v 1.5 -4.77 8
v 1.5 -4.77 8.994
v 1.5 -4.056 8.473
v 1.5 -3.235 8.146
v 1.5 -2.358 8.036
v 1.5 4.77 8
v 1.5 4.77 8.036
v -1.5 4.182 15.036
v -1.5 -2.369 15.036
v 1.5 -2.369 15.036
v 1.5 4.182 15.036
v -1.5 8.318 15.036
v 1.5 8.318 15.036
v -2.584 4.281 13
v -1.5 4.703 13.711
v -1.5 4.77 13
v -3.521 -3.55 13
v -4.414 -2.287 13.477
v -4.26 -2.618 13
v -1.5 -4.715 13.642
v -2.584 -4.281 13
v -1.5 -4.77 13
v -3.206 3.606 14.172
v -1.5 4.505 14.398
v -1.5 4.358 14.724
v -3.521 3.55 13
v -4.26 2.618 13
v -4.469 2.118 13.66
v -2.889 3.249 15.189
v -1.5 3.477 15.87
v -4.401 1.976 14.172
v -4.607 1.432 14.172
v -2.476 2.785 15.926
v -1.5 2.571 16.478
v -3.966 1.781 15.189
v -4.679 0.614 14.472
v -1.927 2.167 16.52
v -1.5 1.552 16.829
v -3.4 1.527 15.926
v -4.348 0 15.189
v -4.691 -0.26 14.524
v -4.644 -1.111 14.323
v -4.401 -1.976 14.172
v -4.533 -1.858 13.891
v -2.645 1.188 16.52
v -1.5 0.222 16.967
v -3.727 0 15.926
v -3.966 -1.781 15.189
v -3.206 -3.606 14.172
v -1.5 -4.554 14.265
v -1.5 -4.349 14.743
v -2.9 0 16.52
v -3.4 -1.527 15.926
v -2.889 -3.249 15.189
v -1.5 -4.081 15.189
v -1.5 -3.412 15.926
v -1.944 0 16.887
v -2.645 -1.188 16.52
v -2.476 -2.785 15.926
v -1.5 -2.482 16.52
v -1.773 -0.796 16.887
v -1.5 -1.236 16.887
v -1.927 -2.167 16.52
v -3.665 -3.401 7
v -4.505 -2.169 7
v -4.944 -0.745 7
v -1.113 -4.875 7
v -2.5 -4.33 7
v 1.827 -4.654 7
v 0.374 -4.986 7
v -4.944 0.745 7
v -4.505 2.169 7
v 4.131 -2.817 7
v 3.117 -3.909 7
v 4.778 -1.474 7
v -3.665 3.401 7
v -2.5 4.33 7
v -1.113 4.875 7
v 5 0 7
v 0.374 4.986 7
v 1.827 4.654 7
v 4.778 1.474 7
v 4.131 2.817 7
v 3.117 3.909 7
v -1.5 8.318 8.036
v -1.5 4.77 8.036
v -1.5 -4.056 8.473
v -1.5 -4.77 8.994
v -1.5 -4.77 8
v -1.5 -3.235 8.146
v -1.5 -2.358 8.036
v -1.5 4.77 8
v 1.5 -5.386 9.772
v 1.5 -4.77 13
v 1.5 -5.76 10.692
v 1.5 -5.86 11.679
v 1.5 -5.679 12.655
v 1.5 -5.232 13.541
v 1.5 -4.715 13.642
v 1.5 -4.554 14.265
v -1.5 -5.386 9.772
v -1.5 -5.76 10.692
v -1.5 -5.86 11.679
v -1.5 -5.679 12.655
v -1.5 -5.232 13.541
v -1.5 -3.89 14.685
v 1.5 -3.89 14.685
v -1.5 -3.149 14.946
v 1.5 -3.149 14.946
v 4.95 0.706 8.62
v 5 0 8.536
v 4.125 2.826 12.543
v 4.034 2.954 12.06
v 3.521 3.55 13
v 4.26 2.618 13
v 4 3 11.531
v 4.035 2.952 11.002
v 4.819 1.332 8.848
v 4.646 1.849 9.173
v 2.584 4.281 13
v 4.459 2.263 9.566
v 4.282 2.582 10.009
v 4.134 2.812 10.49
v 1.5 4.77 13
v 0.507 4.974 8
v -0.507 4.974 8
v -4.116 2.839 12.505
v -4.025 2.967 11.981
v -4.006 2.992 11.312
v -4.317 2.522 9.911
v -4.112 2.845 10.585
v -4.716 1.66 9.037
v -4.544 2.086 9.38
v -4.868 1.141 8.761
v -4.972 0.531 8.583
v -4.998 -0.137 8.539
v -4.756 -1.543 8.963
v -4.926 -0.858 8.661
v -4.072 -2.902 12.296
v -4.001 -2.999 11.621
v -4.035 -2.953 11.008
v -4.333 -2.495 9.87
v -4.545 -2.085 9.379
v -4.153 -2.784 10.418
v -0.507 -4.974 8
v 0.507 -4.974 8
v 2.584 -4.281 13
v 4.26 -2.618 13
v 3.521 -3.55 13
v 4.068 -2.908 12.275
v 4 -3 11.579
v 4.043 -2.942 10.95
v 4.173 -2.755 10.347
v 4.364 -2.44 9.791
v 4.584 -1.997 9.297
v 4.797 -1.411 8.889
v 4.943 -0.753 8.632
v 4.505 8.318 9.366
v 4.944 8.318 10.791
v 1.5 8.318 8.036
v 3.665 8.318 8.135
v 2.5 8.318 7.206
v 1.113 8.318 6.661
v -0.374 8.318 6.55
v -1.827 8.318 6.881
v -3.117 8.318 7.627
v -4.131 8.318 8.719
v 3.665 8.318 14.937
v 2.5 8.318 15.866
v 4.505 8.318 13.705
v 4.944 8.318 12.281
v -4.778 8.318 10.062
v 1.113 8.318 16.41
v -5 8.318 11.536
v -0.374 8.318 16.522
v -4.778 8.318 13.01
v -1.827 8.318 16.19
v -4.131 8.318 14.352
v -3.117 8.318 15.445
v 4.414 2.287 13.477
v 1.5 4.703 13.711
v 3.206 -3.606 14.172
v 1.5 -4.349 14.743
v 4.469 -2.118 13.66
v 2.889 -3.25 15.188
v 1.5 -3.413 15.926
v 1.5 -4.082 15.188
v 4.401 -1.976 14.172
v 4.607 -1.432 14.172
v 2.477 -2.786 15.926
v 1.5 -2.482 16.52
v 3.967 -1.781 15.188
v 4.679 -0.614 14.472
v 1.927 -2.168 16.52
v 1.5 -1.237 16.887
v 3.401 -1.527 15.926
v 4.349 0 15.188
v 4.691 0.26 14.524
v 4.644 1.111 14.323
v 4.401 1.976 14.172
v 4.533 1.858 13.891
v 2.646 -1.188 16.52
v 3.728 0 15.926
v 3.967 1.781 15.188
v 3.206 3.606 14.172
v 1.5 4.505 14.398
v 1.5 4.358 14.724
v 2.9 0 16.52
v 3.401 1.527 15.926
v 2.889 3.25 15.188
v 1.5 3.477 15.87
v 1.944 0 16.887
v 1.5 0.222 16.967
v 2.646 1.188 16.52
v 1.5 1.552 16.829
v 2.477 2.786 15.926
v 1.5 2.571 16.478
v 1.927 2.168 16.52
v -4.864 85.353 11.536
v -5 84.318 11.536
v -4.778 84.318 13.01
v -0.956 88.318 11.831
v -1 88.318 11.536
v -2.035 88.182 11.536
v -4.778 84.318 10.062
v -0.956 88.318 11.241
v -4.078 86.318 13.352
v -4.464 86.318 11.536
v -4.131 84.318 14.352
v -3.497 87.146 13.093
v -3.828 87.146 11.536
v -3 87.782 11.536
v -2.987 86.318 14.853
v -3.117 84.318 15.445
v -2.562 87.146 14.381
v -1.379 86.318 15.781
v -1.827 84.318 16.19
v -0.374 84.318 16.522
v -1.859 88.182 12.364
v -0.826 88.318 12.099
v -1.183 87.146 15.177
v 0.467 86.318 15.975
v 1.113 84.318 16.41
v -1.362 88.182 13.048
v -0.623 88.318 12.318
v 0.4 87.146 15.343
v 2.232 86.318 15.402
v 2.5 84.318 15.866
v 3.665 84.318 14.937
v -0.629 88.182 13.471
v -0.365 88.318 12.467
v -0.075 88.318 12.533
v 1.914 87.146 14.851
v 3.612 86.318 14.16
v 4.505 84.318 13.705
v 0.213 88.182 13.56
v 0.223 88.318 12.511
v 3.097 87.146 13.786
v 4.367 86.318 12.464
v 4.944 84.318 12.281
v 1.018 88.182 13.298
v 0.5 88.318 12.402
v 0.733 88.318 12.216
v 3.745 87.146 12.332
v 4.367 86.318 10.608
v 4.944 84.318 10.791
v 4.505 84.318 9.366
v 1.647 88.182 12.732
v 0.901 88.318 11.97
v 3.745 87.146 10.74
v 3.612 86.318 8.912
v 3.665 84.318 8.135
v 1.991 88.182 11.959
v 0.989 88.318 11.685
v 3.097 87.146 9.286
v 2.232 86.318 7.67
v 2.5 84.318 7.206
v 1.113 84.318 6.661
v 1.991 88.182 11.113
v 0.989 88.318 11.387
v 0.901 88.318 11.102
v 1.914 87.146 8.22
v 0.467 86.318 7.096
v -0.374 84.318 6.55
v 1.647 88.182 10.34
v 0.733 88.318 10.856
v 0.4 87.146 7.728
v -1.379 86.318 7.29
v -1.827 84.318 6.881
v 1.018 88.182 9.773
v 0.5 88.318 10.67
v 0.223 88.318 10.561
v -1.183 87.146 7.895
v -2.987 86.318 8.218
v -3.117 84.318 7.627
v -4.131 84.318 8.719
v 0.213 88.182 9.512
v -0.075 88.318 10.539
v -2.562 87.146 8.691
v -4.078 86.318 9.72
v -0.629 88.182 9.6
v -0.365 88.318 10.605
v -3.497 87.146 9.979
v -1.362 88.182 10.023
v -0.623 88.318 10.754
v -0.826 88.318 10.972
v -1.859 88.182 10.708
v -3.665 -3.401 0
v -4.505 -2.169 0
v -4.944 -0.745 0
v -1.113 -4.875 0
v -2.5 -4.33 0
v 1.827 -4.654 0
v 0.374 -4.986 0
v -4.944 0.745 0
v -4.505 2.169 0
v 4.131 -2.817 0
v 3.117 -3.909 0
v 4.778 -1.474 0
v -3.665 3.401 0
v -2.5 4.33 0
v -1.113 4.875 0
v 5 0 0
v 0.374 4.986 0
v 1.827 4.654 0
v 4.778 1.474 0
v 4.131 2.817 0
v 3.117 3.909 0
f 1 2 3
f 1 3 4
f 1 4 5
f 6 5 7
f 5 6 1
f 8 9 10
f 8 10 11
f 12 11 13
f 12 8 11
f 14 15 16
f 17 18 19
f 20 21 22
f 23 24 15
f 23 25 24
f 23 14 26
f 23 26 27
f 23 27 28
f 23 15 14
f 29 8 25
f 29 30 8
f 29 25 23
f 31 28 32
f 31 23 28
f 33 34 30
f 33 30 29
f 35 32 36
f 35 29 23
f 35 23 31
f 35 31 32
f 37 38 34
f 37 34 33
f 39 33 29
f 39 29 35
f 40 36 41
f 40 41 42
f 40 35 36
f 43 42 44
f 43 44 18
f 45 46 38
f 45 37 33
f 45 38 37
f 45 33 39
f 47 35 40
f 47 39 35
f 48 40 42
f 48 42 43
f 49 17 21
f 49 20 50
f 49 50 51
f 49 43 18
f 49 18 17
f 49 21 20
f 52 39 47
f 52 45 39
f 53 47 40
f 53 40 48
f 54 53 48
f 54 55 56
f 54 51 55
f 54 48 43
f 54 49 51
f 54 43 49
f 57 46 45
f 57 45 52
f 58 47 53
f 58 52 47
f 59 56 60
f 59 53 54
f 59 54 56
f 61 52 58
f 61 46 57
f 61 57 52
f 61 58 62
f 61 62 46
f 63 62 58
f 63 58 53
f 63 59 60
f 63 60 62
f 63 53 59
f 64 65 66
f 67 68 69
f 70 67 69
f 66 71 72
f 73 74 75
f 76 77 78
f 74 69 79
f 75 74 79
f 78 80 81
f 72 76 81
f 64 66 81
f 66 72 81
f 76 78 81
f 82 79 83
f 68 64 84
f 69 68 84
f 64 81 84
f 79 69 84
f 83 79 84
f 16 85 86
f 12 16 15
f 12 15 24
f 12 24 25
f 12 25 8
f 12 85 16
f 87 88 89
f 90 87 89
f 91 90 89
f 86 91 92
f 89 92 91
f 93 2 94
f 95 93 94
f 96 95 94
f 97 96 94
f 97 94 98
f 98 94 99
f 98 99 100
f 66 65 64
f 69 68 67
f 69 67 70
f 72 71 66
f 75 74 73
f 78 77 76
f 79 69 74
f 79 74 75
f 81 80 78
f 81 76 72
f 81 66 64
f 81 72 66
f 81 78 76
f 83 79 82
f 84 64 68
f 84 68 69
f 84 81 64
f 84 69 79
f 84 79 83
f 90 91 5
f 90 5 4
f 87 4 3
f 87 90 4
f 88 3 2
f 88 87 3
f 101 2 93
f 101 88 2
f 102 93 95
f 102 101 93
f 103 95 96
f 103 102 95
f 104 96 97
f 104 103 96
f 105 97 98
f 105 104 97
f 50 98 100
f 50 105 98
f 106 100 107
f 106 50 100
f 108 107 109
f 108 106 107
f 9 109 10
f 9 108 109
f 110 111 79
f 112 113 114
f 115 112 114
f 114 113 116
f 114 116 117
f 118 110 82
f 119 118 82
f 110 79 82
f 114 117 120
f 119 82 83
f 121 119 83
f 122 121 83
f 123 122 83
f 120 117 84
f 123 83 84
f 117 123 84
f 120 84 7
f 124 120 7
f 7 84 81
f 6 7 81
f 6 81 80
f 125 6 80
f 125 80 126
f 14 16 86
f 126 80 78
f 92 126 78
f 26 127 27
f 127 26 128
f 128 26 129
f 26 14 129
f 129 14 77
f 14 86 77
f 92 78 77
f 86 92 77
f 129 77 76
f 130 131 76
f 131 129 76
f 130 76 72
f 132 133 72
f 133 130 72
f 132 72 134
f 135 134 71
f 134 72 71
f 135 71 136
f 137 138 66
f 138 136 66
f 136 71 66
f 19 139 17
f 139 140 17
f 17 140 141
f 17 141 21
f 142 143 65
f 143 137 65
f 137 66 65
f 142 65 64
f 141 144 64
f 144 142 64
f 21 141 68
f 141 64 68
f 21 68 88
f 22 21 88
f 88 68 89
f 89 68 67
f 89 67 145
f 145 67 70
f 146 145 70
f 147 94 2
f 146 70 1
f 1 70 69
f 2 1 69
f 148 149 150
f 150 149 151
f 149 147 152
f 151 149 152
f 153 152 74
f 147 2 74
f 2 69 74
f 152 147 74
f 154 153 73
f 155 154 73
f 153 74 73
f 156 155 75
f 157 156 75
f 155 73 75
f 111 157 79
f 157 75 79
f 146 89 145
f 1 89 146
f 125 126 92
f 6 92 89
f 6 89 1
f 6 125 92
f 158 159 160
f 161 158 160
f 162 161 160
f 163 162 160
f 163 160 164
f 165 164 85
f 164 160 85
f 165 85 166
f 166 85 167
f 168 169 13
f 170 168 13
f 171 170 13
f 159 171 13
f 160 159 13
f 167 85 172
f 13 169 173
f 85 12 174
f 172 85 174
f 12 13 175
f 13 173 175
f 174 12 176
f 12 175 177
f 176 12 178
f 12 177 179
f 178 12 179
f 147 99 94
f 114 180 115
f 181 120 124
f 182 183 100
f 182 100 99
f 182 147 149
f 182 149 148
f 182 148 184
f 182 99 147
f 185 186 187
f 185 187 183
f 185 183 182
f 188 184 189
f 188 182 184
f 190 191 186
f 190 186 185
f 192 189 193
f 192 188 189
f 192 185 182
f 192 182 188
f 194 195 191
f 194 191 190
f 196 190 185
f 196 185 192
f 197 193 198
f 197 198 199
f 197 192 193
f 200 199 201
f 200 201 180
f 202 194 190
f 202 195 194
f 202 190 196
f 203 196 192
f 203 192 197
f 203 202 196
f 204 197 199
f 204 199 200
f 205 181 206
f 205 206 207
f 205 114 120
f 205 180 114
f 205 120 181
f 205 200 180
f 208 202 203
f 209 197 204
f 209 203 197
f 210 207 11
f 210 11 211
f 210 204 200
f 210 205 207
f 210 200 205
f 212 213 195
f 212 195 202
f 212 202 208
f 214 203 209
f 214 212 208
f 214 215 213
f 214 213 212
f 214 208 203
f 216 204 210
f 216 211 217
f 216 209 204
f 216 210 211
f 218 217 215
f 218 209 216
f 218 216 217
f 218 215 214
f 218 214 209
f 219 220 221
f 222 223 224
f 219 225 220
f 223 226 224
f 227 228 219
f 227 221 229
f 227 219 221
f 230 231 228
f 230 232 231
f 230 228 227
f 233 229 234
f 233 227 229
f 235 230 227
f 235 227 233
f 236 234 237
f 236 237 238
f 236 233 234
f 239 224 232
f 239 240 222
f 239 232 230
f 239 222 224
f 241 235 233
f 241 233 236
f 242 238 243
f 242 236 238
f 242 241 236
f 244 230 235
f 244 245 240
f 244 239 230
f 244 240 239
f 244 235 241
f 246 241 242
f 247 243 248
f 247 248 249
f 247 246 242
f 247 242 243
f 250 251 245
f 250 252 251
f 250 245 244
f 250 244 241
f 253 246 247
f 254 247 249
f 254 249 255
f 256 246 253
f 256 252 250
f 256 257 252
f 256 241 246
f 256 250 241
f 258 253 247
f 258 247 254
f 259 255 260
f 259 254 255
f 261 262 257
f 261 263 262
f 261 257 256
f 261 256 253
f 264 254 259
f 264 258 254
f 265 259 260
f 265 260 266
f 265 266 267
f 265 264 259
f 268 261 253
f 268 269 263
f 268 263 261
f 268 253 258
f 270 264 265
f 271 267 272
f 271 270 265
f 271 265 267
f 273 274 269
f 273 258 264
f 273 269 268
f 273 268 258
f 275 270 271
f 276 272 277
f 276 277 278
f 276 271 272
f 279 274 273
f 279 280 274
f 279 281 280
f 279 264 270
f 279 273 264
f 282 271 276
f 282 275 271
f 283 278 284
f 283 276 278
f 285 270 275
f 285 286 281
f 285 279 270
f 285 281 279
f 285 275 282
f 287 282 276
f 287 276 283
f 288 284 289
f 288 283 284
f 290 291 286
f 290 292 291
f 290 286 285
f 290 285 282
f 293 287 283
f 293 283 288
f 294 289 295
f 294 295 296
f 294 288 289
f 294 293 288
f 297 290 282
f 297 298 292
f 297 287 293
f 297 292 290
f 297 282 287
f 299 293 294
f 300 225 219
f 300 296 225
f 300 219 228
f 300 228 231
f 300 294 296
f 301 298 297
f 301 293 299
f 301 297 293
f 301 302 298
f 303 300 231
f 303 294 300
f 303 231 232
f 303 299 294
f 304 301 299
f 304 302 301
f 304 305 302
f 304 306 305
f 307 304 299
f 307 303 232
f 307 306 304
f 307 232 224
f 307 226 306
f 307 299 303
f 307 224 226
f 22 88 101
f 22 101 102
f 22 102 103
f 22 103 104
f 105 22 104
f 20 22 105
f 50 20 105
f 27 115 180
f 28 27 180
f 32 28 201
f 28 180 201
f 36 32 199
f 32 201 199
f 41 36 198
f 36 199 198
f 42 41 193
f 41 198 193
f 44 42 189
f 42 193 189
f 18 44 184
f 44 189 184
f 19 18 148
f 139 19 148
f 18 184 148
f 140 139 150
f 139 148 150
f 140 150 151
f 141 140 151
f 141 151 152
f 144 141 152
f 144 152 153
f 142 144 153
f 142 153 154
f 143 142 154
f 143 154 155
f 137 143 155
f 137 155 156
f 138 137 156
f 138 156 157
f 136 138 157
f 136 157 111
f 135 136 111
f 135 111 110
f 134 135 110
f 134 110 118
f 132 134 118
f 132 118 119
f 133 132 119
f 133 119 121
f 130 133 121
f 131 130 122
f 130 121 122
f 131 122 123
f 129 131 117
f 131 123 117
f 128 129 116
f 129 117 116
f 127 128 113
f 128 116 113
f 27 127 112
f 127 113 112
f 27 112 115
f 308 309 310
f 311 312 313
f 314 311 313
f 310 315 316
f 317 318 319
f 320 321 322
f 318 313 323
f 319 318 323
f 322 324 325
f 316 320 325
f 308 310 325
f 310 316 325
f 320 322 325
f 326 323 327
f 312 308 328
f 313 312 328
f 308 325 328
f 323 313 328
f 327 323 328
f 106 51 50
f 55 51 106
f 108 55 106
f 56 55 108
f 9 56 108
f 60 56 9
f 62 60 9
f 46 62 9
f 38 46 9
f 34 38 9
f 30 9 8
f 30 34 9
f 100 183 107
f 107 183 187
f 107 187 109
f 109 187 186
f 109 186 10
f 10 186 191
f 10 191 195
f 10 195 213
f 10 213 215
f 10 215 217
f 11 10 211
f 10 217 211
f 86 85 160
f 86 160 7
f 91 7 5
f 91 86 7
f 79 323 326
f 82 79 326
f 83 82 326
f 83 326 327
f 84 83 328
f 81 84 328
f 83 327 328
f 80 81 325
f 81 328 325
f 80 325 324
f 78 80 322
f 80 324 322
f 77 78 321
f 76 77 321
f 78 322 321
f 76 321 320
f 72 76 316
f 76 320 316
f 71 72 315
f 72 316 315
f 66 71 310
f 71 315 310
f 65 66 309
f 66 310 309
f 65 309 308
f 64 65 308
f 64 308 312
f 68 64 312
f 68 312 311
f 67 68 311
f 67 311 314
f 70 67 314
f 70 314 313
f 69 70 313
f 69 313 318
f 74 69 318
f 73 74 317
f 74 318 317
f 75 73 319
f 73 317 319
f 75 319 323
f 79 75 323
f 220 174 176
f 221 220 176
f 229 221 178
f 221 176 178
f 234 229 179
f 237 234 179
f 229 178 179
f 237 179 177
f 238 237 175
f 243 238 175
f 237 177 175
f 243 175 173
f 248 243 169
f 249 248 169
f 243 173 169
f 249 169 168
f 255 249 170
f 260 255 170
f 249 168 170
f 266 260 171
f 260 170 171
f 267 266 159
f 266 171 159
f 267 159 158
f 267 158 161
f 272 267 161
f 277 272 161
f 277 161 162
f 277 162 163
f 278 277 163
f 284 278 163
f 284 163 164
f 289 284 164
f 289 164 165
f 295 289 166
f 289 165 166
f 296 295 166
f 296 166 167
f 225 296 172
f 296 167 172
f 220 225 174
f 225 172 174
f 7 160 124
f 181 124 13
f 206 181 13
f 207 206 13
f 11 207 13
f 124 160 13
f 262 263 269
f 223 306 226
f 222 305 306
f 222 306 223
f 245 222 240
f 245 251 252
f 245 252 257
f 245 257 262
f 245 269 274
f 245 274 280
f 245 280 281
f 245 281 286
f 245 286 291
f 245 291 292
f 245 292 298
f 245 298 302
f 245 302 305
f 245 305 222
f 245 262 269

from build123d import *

# Parameters (mm, degrees)
SKETCH_1_R          = 5
EXTRUDE_1_DEPTH     = 7
SKETCH_3_R          = 5
EXTRUDE_3_DEPTH     = 10
FILLET_1_R          = 4
SKETCH_4_W          = 3
SKETCH_4_H          = 11.343584382
CUT_EXTRUDE_5_DEPTH = 9
SKETCH_5_R          = 3
CUT_EXTRUDE_6_DEPTH = 18.5
EXTRUDE_7_DEPTH     = 3
SKETCH_7_R          = 5
EXTRUDE_8_DEPTH     = 80
FILLET_2_R          = 4
SKETCH_8_R          = 3
CUT_EXTRUDE_9_DEPTH = 91.16797782


with BuildPart() as part:
    # Эскиз1 → Вытянуть1 (new body)
    with BuildSketch(Plane.XY):
        Circle(SKETCH_1_R)
    extrude(amount=EXTRUDE_1_DEPTH)


with BuildPart() as body_2:
    # Эскиз3 → Вытянуть3 (new body)
    with BuildSketch(Plane.XY.offset(7)):
        Circle(SKETCH_3_R)
    extrude(amount=EXTRUDE_3_DEPTH)

    # Скругление1
    fillet_1_edges = [body_2.edges().sort_by_distance(p)[0] for p in [
        (-5, 0, 17),
    ]]
    fillet(fillet_1_edges, radius=FILLET_1_R)

    # Эскиз4 → Вытянуть5 (cut)
    with BuildSketch(Plane.XY.offset(17)):
        Rectangle(SKETCH_4_W, SKETCH_4_H)
    extrude(amount=-CUT_EXTRUDE_5_DEPTH, mode=Mode.SUBTRACT)

    # Эскиз5 → Вытянуть6 (cut, symmetric)
    with BuildSketch(Plane(origin=(-1.5, 0, 0), x_dir=(0, 0, -1), z_dir=(1, 0, 0))):
        with Locations(Location((-11.535811132, 0, 0), (0, 0, 119.213344615))):
            Circle(SKETCH_5_R)
    extrude(amount=CUT_EXTRUDE_6_DEPTH, both=True, mode=Mode.SUBTRACT)

    # Эскиз6 → Вытянуть7 (add)
    with BuildSketch(Plane(origin=(-1.5, 0, 0), x_dir=(0, 0, -1), z_dir=(1, 0, 0))):
        with BuildLine():
            Line((-15.035806814, -2.368679074), (-15.035806814, 8.31806101))
            Line((-15.035806814, 8.31806101), (-8.03581545, 8.31806101))
            Line((-8.03581545, 8.31806101), (-8.03581545, -2.357682884))
            ThreePointArc((-8.03581545, -2.357682884), (-11.530313037, -5.86317666), (-15.035806814, -2.368679074))
        make_face()
    extrude(amount=EXTRUDE_7_DEPTH)

    # Эскиз7 → Вытянуть8 (add)
    with BuildSketch(Plane(origin=(0, 8.31806101, 0), x_dir=(-1, 0, 0), z_dir=(0, 1, 0))):
        with Locations((0, 11.535811132)):
            Circle(SKETCH_7_R)
    extrude(amount=EXTRUDE_8_DEPTH)

    # Скругление2
    fillet_2_edges = [body_2.edges().sort_by_distance(p)[0] for p in [
        (5, 88.31806101, 11.535811132),
    ]]
    fillet(fillet_2_edges, radius=FILLET_2_R)

    # Эскиз8 → Вытянуть9 (cut, through all)
    with BuildSketch(Plane(origin=(1.5, 0, 0), x_dir=(0, 0, -1), z_dir=(1, 0, 0))):
        with Locations(Location((-11.535811132, 0, 0), (0, 0, 119.213344615))):
            Circle(SKETCH_8_R)
    extrude(amount=-CUT_EXTRUDE_9_DEPTH, mode=Mode.SUBTRACT)


solid = Compound([part.part, body_2.part])
